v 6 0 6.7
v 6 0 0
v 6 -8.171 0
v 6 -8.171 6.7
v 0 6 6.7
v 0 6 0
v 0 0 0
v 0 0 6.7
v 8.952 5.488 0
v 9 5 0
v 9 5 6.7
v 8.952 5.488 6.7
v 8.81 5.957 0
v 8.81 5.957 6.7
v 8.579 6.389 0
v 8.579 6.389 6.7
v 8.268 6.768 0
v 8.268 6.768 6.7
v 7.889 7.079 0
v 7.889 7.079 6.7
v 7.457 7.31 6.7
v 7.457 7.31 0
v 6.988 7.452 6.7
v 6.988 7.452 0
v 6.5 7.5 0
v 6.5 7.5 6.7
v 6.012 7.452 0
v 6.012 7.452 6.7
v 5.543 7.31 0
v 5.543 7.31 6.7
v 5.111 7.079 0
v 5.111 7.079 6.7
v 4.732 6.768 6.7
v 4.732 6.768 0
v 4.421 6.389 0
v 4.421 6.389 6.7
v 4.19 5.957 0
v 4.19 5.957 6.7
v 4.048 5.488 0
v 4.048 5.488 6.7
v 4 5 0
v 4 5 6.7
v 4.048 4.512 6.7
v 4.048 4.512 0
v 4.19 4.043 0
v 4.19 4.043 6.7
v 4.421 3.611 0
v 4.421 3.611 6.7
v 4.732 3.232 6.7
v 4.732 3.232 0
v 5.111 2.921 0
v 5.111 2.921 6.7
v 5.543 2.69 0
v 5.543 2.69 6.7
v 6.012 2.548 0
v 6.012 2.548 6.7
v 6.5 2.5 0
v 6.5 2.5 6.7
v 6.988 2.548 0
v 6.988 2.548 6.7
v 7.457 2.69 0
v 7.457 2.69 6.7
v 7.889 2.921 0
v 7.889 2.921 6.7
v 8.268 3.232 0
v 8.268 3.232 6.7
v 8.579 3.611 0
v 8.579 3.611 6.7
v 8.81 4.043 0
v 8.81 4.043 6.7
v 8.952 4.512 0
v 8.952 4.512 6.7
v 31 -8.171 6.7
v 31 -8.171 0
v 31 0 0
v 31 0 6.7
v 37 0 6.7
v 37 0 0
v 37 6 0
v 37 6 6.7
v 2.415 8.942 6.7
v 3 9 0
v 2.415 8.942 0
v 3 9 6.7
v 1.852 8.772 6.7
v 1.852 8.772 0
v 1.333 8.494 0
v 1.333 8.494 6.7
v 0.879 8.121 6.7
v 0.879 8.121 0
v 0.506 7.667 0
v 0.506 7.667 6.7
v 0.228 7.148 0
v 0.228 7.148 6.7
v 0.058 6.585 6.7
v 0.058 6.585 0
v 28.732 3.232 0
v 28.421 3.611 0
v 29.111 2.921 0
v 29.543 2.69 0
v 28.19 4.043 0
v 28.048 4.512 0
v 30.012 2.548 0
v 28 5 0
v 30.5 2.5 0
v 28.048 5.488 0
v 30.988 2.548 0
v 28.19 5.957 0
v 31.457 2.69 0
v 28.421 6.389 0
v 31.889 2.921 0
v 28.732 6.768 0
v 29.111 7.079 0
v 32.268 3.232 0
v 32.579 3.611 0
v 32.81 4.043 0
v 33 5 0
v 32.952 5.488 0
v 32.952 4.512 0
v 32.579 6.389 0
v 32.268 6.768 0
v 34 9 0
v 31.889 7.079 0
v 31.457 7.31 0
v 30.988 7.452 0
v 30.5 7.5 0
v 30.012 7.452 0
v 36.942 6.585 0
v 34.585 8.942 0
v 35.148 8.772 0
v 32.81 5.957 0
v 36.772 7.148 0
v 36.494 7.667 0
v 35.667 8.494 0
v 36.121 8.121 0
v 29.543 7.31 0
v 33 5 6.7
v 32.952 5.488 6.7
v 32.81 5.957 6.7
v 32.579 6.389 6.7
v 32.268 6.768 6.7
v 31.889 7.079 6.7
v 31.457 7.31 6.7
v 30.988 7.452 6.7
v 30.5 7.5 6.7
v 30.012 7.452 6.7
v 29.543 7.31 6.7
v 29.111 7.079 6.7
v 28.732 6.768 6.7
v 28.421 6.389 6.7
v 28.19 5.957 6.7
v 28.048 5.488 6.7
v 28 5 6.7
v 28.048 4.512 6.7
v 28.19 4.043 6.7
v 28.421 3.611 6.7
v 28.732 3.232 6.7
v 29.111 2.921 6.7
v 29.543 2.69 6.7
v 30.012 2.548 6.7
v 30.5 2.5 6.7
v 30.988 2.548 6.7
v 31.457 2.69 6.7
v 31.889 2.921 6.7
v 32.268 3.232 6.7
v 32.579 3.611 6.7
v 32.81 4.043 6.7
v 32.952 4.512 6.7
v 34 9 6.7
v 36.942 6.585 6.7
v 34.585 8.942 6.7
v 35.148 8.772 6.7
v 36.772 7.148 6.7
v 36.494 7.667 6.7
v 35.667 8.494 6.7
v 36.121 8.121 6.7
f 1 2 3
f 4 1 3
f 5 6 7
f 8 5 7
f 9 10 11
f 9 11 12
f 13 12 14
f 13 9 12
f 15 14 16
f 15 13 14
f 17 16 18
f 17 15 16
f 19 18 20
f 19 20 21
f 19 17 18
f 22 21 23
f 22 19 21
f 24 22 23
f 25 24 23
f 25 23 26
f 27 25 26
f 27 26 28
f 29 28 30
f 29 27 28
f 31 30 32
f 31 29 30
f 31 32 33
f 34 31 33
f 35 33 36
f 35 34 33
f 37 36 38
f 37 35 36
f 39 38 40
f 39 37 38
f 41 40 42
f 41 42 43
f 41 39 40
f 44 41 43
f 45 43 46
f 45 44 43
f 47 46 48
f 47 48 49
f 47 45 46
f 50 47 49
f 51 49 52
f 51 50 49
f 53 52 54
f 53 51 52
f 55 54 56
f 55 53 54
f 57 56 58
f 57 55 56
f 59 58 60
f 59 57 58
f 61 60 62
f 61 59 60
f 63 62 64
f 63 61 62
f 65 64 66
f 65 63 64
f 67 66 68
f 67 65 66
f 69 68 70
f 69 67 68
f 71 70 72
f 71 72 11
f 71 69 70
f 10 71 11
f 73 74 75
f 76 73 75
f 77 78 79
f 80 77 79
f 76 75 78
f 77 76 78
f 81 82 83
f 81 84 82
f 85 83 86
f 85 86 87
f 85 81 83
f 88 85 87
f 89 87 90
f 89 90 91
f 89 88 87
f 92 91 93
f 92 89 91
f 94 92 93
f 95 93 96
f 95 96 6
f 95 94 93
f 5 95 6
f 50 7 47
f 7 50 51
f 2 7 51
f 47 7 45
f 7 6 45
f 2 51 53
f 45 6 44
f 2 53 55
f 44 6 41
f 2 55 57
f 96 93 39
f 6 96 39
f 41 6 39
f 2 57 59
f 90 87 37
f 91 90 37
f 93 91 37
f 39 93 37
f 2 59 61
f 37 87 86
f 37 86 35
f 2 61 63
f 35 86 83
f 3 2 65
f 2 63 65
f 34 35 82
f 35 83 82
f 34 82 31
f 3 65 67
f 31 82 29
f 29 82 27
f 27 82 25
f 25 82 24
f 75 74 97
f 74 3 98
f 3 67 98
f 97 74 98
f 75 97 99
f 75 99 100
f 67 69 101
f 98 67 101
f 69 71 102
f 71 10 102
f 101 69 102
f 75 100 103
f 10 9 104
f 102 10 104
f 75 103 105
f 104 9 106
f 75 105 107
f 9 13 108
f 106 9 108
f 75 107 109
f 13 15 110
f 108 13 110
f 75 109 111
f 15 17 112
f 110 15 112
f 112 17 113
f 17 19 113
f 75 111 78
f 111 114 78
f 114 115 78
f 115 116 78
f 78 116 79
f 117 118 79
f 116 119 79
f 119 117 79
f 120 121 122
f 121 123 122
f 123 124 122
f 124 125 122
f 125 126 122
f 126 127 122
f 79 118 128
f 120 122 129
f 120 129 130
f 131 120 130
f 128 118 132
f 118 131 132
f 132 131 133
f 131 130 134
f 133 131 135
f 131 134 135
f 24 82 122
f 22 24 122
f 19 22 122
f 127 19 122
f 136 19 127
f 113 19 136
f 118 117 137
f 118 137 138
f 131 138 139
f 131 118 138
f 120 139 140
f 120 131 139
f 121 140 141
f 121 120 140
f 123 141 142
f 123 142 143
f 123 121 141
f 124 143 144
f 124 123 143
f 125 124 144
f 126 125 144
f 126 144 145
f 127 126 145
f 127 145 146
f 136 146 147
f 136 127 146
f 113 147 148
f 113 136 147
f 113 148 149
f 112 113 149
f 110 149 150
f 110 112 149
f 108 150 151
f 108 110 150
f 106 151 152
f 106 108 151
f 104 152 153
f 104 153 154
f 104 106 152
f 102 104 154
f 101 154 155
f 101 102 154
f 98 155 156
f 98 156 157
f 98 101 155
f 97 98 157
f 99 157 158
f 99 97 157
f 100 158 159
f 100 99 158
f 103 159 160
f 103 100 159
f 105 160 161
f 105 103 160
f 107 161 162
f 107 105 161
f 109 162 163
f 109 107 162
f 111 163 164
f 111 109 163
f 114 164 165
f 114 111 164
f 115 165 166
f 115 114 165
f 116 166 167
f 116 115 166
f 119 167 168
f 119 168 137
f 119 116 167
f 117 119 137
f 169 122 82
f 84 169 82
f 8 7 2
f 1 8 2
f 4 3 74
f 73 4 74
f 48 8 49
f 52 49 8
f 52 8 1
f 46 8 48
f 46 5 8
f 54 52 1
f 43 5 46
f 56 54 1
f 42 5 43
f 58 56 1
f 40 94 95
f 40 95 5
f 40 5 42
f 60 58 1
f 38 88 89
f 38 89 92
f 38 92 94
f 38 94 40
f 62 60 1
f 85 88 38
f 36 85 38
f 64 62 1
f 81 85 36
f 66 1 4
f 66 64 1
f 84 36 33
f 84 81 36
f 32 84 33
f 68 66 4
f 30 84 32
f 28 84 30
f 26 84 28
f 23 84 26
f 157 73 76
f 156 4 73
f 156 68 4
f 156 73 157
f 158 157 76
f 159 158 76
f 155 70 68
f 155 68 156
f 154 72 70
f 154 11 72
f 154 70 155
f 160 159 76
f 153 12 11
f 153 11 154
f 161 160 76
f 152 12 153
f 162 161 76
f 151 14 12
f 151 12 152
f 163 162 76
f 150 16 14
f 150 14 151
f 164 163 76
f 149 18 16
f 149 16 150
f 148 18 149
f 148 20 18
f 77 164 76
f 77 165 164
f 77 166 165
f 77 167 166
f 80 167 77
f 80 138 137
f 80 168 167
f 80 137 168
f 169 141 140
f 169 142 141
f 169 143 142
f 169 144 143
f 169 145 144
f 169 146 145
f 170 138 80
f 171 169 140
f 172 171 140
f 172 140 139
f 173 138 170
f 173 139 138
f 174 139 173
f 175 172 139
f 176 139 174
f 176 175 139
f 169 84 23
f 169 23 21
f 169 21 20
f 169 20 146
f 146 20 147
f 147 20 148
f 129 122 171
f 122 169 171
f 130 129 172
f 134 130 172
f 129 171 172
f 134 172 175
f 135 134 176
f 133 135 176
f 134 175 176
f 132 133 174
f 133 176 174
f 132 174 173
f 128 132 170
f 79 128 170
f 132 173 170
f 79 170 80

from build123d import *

# Parameters (mm, degrees)
SKETCH_R    = 2.5
PAD_DEPTH   = 6.7
FILLET_R    = 3
FILLET001_R = 3


with BuildPart() as part:
    # Sketch → Pad (new body)
    with BuildSketch(Plane.XY):
        Polygon((0, 0), (6, 0), (6, -8.17137), (31, -8.17137), (31, 0), (37, 0), (37, 9), (0, 9), align=None)
        with Locations((6.5, 5)):
            Circle(SKETCH_R, mode=Mode.SUBTRACT)
        with Locations((30.5, 5)):
            Circle(SKETCH_R, mode=Mode.SUBTRACT)
    extrude(amount=PAD_DEPTH)

    # Fillet
    fillet_edges = [part.edges().sort_by_distance(p)[0] for p in [
        (37, 9, 3.35),
    ]]
    fillet(fillet_edges, radius=FILLET_R)

    # Fillet001
    fillet001_edges = [part.edges().sort_by_distance(p)[0] for p in [
        (0, 9, 3.35),
    ]]
    fillet(fillet001_edges, radius=FILLET001_R)


solid = part.part
